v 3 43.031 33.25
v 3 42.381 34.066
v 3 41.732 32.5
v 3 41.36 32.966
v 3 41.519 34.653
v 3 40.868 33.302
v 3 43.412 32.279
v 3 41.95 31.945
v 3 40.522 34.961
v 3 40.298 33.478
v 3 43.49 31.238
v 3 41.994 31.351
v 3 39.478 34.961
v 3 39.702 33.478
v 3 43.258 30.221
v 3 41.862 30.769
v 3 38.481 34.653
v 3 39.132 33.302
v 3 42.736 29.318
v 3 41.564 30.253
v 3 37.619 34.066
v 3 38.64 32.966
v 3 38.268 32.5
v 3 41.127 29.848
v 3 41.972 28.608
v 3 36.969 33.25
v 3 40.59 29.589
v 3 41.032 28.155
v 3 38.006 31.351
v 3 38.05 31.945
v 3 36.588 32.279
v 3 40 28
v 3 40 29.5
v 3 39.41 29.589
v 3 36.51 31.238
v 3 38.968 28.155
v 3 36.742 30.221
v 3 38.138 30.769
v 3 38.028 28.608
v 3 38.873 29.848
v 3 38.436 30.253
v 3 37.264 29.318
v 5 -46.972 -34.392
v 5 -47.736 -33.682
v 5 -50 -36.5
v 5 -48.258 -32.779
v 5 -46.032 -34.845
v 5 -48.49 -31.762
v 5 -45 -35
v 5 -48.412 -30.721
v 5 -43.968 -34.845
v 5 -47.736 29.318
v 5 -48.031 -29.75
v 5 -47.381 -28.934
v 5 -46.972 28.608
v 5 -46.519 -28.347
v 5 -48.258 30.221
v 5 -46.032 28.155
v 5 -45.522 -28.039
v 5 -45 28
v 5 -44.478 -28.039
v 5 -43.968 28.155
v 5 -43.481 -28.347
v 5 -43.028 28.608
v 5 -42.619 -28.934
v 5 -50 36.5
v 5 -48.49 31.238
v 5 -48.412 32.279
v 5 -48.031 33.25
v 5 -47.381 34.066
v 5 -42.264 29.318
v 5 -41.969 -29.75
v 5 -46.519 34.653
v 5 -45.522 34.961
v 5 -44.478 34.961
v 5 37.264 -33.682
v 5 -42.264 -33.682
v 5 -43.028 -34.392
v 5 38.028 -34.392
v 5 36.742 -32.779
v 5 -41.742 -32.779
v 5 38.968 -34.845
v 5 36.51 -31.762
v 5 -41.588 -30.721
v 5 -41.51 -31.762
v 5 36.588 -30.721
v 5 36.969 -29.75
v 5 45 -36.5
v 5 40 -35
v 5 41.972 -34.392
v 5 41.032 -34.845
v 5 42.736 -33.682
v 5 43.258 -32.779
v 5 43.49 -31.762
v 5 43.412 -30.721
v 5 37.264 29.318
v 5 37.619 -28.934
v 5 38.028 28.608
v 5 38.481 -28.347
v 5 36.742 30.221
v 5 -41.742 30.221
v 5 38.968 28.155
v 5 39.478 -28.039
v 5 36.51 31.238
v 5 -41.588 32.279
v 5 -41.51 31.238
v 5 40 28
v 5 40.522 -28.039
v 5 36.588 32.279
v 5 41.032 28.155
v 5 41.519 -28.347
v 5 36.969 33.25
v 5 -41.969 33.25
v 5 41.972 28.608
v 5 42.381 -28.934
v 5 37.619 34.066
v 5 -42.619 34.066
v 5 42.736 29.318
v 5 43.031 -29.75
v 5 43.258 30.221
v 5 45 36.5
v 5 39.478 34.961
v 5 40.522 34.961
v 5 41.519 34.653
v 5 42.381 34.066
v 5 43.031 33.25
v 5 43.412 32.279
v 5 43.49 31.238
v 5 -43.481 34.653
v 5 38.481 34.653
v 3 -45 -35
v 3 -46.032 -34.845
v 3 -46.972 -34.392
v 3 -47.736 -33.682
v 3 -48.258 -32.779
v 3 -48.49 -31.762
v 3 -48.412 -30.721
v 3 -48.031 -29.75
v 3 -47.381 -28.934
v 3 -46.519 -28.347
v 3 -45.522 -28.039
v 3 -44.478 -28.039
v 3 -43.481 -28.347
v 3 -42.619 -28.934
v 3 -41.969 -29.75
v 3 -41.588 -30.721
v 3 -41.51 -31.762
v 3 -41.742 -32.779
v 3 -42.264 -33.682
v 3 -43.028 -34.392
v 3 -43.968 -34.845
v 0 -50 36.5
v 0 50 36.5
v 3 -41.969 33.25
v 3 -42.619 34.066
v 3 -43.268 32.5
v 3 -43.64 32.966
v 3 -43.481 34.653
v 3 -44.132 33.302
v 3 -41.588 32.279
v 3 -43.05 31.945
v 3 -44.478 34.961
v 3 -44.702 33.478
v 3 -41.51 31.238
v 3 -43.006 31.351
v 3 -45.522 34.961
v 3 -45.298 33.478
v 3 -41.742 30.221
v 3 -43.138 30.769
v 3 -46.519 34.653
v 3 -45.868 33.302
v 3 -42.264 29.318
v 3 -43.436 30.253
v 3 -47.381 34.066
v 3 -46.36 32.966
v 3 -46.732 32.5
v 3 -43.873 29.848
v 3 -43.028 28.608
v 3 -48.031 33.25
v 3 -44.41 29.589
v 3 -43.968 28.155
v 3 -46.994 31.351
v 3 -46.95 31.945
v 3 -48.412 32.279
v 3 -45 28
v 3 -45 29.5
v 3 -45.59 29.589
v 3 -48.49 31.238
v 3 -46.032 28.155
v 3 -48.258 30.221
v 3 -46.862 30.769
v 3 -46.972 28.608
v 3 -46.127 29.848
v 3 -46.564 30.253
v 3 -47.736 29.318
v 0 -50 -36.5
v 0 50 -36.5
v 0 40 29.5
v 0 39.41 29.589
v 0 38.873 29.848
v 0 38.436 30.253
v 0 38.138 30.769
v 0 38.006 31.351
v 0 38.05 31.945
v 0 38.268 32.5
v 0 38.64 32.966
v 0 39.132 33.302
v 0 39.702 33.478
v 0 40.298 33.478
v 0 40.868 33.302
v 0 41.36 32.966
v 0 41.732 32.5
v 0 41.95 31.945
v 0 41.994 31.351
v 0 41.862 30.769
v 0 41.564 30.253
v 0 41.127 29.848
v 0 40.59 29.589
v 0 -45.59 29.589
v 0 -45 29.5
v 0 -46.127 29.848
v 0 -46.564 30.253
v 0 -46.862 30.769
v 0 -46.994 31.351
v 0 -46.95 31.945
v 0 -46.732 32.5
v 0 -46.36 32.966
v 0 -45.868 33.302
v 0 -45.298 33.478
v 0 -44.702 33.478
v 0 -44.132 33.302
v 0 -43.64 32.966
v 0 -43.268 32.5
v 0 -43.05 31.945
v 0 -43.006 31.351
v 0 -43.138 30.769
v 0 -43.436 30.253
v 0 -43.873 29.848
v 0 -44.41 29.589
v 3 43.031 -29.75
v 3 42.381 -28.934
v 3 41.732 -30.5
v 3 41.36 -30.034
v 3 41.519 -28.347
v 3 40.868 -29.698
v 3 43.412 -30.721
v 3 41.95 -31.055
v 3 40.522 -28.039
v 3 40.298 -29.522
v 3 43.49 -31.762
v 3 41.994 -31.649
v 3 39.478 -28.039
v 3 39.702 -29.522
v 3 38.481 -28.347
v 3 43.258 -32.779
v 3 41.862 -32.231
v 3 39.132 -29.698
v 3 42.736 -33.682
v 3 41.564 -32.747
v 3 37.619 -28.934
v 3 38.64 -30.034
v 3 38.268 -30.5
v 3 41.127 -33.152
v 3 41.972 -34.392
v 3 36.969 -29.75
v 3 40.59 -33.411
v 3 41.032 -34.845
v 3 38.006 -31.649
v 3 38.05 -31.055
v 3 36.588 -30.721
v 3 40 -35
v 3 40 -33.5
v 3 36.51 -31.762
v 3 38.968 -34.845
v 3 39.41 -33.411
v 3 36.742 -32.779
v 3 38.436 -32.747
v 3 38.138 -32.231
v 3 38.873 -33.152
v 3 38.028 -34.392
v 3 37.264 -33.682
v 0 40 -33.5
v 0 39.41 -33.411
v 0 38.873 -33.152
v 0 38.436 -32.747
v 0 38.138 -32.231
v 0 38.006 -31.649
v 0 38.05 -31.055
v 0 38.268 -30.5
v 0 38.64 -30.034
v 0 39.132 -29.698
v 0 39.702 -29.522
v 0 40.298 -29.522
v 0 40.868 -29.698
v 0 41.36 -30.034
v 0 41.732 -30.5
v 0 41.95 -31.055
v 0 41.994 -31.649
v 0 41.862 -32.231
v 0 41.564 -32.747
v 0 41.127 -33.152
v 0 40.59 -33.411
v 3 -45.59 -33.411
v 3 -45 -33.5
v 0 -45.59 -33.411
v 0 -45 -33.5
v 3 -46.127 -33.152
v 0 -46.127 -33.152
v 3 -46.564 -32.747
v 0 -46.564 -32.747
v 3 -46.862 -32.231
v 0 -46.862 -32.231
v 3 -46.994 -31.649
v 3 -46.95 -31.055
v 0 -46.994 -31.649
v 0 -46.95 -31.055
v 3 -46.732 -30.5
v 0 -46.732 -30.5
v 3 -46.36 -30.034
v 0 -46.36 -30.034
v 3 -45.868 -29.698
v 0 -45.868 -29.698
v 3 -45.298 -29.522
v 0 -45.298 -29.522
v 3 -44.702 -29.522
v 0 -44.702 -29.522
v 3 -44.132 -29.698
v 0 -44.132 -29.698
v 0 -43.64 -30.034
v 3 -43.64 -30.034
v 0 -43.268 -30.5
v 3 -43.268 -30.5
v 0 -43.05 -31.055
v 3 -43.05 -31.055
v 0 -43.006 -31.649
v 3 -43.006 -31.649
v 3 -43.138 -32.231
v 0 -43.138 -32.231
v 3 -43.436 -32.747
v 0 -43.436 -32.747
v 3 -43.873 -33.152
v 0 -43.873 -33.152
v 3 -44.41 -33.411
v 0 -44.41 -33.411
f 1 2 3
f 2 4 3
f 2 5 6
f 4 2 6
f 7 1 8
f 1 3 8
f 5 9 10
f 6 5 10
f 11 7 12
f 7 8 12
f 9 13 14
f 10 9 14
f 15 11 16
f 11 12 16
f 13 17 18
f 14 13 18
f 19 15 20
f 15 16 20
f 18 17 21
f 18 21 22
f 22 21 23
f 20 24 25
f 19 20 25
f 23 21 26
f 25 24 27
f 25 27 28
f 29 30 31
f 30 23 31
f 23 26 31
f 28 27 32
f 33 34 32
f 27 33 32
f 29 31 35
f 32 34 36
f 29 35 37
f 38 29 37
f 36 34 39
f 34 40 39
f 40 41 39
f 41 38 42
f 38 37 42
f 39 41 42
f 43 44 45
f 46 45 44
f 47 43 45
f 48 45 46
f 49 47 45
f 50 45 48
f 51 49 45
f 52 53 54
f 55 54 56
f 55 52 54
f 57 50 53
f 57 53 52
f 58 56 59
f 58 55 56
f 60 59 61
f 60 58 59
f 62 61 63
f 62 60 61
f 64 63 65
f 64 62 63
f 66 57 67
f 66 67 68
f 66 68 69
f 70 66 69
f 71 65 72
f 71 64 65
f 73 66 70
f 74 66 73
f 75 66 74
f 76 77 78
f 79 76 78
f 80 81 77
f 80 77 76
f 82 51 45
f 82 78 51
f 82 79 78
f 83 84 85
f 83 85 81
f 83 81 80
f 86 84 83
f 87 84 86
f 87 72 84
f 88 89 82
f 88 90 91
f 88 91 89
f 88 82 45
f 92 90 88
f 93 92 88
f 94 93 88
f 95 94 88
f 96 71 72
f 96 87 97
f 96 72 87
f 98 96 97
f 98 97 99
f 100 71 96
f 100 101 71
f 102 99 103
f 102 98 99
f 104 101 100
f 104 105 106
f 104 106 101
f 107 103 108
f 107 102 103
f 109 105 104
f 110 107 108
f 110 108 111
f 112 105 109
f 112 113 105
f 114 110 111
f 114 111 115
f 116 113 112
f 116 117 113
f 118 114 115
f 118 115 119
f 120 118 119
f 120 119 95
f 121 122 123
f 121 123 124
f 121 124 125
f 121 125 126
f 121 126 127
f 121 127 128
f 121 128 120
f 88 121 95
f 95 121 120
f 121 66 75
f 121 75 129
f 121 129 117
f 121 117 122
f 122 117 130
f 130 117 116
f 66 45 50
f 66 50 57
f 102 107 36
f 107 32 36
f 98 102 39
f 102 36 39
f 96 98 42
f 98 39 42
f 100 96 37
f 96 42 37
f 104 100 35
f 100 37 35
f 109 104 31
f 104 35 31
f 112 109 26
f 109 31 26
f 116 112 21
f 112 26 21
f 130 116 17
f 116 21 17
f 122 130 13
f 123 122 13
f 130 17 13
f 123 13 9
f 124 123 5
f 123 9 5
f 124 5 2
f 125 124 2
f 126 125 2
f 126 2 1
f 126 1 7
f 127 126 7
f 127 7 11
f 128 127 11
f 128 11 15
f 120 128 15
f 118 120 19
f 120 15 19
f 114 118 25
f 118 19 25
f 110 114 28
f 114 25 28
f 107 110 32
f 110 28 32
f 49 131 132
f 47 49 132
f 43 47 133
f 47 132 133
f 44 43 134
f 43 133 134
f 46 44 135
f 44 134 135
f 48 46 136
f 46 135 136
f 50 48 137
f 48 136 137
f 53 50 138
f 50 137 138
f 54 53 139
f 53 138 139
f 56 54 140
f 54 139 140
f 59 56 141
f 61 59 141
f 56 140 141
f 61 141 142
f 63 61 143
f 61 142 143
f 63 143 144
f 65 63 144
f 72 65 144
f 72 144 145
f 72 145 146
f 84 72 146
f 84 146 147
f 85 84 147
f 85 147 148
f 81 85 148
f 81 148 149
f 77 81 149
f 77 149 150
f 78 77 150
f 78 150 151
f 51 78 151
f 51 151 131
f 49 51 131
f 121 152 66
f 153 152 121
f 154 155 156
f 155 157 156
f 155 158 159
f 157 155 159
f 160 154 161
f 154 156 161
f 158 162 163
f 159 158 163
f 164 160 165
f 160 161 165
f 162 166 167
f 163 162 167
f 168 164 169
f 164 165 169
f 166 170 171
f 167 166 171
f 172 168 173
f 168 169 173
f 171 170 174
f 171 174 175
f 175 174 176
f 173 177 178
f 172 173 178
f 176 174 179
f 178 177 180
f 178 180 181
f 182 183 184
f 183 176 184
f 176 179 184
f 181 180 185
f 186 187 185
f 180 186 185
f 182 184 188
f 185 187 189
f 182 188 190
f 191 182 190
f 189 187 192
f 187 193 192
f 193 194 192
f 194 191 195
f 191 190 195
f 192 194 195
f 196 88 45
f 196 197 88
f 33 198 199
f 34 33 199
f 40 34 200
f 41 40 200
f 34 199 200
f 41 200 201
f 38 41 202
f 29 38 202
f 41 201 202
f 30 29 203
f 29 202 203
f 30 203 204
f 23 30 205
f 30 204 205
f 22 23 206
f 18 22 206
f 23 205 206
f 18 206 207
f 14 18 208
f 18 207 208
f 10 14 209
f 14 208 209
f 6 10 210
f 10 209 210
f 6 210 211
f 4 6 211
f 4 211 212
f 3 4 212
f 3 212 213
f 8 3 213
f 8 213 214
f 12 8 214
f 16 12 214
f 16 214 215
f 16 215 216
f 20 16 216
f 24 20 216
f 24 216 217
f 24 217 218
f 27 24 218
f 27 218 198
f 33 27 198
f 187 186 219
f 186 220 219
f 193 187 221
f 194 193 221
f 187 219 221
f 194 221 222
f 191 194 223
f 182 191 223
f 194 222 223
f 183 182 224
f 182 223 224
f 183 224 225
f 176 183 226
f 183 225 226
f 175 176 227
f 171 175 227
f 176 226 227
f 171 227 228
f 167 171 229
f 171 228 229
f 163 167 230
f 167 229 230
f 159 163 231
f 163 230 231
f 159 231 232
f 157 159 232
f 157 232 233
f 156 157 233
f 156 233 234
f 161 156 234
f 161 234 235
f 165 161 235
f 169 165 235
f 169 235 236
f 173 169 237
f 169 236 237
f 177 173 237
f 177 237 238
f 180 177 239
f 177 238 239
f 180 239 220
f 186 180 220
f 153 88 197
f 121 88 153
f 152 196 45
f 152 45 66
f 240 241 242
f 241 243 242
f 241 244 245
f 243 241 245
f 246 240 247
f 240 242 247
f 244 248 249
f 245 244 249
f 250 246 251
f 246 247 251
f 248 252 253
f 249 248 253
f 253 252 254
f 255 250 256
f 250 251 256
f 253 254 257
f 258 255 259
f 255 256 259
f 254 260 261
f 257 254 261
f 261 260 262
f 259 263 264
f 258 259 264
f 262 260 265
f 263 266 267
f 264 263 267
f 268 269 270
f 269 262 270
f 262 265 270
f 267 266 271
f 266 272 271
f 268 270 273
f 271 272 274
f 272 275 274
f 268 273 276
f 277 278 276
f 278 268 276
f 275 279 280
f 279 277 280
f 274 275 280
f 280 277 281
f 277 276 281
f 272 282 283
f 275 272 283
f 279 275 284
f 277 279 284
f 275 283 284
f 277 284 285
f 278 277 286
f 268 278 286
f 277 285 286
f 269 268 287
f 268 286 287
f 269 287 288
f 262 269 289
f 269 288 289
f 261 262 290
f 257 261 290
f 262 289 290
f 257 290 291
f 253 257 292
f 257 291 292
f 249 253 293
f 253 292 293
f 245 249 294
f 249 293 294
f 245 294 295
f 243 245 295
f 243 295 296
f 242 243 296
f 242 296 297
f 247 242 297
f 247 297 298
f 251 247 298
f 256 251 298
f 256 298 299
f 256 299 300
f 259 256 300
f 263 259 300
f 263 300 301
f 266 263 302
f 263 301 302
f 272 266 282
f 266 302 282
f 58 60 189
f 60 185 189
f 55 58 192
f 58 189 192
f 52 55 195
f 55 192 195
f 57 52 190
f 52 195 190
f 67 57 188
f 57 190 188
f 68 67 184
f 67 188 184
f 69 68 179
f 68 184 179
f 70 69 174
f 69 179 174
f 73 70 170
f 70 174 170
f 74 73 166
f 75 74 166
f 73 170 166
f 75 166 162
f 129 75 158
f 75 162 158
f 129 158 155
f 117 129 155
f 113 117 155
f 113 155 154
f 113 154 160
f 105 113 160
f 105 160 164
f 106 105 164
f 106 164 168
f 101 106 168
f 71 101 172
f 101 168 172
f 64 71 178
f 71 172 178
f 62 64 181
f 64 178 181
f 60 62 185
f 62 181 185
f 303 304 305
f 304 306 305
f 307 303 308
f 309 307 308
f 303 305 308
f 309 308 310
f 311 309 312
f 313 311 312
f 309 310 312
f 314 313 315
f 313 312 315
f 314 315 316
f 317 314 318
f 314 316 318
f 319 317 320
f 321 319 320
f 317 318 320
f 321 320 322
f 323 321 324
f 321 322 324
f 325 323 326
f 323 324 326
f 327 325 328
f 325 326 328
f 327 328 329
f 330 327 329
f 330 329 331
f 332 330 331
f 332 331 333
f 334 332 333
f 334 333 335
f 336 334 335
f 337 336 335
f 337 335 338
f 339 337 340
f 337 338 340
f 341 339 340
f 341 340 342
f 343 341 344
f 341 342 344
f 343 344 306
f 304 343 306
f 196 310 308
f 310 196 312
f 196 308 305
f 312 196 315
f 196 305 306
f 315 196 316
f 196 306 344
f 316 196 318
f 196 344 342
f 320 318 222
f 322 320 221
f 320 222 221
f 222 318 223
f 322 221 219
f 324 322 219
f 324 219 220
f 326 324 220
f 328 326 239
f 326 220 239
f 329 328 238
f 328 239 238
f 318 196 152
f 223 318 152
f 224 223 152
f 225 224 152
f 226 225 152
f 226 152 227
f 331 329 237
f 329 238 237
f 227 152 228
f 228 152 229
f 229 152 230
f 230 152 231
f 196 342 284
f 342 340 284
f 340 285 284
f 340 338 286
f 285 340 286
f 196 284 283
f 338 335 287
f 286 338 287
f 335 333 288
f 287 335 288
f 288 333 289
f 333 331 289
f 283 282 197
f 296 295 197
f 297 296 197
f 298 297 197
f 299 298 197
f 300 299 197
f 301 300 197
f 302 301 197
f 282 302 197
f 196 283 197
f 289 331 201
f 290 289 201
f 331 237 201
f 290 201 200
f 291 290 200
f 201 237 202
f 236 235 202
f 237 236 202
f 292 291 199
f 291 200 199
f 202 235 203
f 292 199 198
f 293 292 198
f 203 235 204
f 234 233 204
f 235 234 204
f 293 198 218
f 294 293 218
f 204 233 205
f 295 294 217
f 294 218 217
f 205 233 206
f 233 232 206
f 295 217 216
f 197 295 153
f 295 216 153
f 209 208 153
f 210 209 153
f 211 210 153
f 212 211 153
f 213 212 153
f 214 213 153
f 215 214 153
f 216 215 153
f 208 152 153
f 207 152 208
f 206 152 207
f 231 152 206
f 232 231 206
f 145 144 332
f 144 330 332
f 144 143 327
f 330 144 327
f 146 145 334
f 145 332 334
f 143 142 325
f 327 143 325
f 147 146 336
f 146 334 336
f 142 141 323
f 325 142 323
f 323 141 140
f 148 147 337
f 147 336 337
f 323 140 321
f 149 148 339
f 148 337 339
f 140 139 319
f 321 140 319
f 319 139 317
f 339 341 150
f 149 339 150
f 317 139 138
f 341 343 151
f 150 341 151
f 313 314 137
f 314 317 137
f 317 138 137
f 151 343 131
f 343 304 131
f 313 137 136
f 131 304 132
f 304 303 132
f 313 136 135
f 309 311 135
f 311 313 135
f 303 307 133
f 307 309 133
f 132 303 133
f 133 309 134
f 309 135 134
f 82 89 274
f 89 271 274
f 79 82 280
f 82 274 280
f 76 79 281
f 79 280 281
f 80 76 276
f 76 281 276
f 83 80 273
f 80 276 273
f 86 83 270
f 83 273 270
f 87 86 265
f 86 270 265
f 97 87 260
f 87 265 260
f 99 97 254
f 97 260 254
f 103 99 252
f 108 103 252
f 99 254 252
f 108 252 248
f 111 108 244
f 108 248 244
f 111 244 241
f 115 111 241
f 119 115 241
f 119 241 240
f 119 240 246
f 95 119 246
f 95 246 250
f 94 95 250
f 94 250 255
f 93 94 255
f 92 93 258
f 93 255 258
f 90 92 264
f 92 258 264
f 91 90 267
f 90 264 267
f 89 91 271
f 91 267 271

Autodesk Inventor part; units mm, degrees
ref_plane "YZ Plane" through (0, 0, 0) normal (1, 0, 0) x (0, 1, 0)
ref_plane "XZ Plane" through (0, 0, 0) normal (0, 1, 0) x (-1, 0, 0)
ref_plane "XY Plane" through (0, 0, 0) normal (0, 0, 1) x (1, 0, 0)
sketch "Skizze1" plane through (0, 0, 0) normal (1, 0, 0) x (0, 1, 0)
  line L0 (-50, 36.5) -> (50, 36.5)
  line L1 (50, 36.5) -> (50, -36.5)
  line L2 (50, -36.5) -> (-50, -36.5)
  line L3 (-50, -36.5) -> (-50, 36.5)
  line L4 (-50, 36.5) -> (50, -36.5) construction
  line L5 (50, 36.5) -> (-50, -36.5) construction
  point P0 (0, 0)
  dimension "d0" = 73
  dimension "d1" = 100
extrude "Extrusion1" add sketch "Skizze1" along normal blind 5
chamfer "Fase1" distance 5 angle 45 1 edges at (5, 50, 0)
sketch "Skizze2" plane through (5, 0, 0) normal (1, 0, 0) x (0, 0, -1)
  line L0 (-36.5, 45) -> (-36.5, -50) projected
  line L1 (-36.5, 45) -> (36.5, 45) projected
  line L2 (-36.5, -50) -> (36.5, -50) projected
  line L3 (0, -70) -> (0, 70) construction
  point P0 (0, 0)
  point P1 (-31.5, -45)
  point P2 (-31.5, 40)
  point P3 (31.5, -45)
  point P4 (31.5, 40)
  dimension "d7" = 5
  dimension "d8" = 5
  dimension "d9" = 5
  dimension "d10" = 5
hole "Bohrung1" at (5, -45, 31.5) at (5, 40, 31.5) at (5, 40, -31.5) at (5, -45, -31.5) direction (-1, 0, 0) diameter 4 end through all counterbore diameter 7 counterbore depth 2
properties part number "Deckel_2_Frame" material "PC/ABS-Kunststoff"
